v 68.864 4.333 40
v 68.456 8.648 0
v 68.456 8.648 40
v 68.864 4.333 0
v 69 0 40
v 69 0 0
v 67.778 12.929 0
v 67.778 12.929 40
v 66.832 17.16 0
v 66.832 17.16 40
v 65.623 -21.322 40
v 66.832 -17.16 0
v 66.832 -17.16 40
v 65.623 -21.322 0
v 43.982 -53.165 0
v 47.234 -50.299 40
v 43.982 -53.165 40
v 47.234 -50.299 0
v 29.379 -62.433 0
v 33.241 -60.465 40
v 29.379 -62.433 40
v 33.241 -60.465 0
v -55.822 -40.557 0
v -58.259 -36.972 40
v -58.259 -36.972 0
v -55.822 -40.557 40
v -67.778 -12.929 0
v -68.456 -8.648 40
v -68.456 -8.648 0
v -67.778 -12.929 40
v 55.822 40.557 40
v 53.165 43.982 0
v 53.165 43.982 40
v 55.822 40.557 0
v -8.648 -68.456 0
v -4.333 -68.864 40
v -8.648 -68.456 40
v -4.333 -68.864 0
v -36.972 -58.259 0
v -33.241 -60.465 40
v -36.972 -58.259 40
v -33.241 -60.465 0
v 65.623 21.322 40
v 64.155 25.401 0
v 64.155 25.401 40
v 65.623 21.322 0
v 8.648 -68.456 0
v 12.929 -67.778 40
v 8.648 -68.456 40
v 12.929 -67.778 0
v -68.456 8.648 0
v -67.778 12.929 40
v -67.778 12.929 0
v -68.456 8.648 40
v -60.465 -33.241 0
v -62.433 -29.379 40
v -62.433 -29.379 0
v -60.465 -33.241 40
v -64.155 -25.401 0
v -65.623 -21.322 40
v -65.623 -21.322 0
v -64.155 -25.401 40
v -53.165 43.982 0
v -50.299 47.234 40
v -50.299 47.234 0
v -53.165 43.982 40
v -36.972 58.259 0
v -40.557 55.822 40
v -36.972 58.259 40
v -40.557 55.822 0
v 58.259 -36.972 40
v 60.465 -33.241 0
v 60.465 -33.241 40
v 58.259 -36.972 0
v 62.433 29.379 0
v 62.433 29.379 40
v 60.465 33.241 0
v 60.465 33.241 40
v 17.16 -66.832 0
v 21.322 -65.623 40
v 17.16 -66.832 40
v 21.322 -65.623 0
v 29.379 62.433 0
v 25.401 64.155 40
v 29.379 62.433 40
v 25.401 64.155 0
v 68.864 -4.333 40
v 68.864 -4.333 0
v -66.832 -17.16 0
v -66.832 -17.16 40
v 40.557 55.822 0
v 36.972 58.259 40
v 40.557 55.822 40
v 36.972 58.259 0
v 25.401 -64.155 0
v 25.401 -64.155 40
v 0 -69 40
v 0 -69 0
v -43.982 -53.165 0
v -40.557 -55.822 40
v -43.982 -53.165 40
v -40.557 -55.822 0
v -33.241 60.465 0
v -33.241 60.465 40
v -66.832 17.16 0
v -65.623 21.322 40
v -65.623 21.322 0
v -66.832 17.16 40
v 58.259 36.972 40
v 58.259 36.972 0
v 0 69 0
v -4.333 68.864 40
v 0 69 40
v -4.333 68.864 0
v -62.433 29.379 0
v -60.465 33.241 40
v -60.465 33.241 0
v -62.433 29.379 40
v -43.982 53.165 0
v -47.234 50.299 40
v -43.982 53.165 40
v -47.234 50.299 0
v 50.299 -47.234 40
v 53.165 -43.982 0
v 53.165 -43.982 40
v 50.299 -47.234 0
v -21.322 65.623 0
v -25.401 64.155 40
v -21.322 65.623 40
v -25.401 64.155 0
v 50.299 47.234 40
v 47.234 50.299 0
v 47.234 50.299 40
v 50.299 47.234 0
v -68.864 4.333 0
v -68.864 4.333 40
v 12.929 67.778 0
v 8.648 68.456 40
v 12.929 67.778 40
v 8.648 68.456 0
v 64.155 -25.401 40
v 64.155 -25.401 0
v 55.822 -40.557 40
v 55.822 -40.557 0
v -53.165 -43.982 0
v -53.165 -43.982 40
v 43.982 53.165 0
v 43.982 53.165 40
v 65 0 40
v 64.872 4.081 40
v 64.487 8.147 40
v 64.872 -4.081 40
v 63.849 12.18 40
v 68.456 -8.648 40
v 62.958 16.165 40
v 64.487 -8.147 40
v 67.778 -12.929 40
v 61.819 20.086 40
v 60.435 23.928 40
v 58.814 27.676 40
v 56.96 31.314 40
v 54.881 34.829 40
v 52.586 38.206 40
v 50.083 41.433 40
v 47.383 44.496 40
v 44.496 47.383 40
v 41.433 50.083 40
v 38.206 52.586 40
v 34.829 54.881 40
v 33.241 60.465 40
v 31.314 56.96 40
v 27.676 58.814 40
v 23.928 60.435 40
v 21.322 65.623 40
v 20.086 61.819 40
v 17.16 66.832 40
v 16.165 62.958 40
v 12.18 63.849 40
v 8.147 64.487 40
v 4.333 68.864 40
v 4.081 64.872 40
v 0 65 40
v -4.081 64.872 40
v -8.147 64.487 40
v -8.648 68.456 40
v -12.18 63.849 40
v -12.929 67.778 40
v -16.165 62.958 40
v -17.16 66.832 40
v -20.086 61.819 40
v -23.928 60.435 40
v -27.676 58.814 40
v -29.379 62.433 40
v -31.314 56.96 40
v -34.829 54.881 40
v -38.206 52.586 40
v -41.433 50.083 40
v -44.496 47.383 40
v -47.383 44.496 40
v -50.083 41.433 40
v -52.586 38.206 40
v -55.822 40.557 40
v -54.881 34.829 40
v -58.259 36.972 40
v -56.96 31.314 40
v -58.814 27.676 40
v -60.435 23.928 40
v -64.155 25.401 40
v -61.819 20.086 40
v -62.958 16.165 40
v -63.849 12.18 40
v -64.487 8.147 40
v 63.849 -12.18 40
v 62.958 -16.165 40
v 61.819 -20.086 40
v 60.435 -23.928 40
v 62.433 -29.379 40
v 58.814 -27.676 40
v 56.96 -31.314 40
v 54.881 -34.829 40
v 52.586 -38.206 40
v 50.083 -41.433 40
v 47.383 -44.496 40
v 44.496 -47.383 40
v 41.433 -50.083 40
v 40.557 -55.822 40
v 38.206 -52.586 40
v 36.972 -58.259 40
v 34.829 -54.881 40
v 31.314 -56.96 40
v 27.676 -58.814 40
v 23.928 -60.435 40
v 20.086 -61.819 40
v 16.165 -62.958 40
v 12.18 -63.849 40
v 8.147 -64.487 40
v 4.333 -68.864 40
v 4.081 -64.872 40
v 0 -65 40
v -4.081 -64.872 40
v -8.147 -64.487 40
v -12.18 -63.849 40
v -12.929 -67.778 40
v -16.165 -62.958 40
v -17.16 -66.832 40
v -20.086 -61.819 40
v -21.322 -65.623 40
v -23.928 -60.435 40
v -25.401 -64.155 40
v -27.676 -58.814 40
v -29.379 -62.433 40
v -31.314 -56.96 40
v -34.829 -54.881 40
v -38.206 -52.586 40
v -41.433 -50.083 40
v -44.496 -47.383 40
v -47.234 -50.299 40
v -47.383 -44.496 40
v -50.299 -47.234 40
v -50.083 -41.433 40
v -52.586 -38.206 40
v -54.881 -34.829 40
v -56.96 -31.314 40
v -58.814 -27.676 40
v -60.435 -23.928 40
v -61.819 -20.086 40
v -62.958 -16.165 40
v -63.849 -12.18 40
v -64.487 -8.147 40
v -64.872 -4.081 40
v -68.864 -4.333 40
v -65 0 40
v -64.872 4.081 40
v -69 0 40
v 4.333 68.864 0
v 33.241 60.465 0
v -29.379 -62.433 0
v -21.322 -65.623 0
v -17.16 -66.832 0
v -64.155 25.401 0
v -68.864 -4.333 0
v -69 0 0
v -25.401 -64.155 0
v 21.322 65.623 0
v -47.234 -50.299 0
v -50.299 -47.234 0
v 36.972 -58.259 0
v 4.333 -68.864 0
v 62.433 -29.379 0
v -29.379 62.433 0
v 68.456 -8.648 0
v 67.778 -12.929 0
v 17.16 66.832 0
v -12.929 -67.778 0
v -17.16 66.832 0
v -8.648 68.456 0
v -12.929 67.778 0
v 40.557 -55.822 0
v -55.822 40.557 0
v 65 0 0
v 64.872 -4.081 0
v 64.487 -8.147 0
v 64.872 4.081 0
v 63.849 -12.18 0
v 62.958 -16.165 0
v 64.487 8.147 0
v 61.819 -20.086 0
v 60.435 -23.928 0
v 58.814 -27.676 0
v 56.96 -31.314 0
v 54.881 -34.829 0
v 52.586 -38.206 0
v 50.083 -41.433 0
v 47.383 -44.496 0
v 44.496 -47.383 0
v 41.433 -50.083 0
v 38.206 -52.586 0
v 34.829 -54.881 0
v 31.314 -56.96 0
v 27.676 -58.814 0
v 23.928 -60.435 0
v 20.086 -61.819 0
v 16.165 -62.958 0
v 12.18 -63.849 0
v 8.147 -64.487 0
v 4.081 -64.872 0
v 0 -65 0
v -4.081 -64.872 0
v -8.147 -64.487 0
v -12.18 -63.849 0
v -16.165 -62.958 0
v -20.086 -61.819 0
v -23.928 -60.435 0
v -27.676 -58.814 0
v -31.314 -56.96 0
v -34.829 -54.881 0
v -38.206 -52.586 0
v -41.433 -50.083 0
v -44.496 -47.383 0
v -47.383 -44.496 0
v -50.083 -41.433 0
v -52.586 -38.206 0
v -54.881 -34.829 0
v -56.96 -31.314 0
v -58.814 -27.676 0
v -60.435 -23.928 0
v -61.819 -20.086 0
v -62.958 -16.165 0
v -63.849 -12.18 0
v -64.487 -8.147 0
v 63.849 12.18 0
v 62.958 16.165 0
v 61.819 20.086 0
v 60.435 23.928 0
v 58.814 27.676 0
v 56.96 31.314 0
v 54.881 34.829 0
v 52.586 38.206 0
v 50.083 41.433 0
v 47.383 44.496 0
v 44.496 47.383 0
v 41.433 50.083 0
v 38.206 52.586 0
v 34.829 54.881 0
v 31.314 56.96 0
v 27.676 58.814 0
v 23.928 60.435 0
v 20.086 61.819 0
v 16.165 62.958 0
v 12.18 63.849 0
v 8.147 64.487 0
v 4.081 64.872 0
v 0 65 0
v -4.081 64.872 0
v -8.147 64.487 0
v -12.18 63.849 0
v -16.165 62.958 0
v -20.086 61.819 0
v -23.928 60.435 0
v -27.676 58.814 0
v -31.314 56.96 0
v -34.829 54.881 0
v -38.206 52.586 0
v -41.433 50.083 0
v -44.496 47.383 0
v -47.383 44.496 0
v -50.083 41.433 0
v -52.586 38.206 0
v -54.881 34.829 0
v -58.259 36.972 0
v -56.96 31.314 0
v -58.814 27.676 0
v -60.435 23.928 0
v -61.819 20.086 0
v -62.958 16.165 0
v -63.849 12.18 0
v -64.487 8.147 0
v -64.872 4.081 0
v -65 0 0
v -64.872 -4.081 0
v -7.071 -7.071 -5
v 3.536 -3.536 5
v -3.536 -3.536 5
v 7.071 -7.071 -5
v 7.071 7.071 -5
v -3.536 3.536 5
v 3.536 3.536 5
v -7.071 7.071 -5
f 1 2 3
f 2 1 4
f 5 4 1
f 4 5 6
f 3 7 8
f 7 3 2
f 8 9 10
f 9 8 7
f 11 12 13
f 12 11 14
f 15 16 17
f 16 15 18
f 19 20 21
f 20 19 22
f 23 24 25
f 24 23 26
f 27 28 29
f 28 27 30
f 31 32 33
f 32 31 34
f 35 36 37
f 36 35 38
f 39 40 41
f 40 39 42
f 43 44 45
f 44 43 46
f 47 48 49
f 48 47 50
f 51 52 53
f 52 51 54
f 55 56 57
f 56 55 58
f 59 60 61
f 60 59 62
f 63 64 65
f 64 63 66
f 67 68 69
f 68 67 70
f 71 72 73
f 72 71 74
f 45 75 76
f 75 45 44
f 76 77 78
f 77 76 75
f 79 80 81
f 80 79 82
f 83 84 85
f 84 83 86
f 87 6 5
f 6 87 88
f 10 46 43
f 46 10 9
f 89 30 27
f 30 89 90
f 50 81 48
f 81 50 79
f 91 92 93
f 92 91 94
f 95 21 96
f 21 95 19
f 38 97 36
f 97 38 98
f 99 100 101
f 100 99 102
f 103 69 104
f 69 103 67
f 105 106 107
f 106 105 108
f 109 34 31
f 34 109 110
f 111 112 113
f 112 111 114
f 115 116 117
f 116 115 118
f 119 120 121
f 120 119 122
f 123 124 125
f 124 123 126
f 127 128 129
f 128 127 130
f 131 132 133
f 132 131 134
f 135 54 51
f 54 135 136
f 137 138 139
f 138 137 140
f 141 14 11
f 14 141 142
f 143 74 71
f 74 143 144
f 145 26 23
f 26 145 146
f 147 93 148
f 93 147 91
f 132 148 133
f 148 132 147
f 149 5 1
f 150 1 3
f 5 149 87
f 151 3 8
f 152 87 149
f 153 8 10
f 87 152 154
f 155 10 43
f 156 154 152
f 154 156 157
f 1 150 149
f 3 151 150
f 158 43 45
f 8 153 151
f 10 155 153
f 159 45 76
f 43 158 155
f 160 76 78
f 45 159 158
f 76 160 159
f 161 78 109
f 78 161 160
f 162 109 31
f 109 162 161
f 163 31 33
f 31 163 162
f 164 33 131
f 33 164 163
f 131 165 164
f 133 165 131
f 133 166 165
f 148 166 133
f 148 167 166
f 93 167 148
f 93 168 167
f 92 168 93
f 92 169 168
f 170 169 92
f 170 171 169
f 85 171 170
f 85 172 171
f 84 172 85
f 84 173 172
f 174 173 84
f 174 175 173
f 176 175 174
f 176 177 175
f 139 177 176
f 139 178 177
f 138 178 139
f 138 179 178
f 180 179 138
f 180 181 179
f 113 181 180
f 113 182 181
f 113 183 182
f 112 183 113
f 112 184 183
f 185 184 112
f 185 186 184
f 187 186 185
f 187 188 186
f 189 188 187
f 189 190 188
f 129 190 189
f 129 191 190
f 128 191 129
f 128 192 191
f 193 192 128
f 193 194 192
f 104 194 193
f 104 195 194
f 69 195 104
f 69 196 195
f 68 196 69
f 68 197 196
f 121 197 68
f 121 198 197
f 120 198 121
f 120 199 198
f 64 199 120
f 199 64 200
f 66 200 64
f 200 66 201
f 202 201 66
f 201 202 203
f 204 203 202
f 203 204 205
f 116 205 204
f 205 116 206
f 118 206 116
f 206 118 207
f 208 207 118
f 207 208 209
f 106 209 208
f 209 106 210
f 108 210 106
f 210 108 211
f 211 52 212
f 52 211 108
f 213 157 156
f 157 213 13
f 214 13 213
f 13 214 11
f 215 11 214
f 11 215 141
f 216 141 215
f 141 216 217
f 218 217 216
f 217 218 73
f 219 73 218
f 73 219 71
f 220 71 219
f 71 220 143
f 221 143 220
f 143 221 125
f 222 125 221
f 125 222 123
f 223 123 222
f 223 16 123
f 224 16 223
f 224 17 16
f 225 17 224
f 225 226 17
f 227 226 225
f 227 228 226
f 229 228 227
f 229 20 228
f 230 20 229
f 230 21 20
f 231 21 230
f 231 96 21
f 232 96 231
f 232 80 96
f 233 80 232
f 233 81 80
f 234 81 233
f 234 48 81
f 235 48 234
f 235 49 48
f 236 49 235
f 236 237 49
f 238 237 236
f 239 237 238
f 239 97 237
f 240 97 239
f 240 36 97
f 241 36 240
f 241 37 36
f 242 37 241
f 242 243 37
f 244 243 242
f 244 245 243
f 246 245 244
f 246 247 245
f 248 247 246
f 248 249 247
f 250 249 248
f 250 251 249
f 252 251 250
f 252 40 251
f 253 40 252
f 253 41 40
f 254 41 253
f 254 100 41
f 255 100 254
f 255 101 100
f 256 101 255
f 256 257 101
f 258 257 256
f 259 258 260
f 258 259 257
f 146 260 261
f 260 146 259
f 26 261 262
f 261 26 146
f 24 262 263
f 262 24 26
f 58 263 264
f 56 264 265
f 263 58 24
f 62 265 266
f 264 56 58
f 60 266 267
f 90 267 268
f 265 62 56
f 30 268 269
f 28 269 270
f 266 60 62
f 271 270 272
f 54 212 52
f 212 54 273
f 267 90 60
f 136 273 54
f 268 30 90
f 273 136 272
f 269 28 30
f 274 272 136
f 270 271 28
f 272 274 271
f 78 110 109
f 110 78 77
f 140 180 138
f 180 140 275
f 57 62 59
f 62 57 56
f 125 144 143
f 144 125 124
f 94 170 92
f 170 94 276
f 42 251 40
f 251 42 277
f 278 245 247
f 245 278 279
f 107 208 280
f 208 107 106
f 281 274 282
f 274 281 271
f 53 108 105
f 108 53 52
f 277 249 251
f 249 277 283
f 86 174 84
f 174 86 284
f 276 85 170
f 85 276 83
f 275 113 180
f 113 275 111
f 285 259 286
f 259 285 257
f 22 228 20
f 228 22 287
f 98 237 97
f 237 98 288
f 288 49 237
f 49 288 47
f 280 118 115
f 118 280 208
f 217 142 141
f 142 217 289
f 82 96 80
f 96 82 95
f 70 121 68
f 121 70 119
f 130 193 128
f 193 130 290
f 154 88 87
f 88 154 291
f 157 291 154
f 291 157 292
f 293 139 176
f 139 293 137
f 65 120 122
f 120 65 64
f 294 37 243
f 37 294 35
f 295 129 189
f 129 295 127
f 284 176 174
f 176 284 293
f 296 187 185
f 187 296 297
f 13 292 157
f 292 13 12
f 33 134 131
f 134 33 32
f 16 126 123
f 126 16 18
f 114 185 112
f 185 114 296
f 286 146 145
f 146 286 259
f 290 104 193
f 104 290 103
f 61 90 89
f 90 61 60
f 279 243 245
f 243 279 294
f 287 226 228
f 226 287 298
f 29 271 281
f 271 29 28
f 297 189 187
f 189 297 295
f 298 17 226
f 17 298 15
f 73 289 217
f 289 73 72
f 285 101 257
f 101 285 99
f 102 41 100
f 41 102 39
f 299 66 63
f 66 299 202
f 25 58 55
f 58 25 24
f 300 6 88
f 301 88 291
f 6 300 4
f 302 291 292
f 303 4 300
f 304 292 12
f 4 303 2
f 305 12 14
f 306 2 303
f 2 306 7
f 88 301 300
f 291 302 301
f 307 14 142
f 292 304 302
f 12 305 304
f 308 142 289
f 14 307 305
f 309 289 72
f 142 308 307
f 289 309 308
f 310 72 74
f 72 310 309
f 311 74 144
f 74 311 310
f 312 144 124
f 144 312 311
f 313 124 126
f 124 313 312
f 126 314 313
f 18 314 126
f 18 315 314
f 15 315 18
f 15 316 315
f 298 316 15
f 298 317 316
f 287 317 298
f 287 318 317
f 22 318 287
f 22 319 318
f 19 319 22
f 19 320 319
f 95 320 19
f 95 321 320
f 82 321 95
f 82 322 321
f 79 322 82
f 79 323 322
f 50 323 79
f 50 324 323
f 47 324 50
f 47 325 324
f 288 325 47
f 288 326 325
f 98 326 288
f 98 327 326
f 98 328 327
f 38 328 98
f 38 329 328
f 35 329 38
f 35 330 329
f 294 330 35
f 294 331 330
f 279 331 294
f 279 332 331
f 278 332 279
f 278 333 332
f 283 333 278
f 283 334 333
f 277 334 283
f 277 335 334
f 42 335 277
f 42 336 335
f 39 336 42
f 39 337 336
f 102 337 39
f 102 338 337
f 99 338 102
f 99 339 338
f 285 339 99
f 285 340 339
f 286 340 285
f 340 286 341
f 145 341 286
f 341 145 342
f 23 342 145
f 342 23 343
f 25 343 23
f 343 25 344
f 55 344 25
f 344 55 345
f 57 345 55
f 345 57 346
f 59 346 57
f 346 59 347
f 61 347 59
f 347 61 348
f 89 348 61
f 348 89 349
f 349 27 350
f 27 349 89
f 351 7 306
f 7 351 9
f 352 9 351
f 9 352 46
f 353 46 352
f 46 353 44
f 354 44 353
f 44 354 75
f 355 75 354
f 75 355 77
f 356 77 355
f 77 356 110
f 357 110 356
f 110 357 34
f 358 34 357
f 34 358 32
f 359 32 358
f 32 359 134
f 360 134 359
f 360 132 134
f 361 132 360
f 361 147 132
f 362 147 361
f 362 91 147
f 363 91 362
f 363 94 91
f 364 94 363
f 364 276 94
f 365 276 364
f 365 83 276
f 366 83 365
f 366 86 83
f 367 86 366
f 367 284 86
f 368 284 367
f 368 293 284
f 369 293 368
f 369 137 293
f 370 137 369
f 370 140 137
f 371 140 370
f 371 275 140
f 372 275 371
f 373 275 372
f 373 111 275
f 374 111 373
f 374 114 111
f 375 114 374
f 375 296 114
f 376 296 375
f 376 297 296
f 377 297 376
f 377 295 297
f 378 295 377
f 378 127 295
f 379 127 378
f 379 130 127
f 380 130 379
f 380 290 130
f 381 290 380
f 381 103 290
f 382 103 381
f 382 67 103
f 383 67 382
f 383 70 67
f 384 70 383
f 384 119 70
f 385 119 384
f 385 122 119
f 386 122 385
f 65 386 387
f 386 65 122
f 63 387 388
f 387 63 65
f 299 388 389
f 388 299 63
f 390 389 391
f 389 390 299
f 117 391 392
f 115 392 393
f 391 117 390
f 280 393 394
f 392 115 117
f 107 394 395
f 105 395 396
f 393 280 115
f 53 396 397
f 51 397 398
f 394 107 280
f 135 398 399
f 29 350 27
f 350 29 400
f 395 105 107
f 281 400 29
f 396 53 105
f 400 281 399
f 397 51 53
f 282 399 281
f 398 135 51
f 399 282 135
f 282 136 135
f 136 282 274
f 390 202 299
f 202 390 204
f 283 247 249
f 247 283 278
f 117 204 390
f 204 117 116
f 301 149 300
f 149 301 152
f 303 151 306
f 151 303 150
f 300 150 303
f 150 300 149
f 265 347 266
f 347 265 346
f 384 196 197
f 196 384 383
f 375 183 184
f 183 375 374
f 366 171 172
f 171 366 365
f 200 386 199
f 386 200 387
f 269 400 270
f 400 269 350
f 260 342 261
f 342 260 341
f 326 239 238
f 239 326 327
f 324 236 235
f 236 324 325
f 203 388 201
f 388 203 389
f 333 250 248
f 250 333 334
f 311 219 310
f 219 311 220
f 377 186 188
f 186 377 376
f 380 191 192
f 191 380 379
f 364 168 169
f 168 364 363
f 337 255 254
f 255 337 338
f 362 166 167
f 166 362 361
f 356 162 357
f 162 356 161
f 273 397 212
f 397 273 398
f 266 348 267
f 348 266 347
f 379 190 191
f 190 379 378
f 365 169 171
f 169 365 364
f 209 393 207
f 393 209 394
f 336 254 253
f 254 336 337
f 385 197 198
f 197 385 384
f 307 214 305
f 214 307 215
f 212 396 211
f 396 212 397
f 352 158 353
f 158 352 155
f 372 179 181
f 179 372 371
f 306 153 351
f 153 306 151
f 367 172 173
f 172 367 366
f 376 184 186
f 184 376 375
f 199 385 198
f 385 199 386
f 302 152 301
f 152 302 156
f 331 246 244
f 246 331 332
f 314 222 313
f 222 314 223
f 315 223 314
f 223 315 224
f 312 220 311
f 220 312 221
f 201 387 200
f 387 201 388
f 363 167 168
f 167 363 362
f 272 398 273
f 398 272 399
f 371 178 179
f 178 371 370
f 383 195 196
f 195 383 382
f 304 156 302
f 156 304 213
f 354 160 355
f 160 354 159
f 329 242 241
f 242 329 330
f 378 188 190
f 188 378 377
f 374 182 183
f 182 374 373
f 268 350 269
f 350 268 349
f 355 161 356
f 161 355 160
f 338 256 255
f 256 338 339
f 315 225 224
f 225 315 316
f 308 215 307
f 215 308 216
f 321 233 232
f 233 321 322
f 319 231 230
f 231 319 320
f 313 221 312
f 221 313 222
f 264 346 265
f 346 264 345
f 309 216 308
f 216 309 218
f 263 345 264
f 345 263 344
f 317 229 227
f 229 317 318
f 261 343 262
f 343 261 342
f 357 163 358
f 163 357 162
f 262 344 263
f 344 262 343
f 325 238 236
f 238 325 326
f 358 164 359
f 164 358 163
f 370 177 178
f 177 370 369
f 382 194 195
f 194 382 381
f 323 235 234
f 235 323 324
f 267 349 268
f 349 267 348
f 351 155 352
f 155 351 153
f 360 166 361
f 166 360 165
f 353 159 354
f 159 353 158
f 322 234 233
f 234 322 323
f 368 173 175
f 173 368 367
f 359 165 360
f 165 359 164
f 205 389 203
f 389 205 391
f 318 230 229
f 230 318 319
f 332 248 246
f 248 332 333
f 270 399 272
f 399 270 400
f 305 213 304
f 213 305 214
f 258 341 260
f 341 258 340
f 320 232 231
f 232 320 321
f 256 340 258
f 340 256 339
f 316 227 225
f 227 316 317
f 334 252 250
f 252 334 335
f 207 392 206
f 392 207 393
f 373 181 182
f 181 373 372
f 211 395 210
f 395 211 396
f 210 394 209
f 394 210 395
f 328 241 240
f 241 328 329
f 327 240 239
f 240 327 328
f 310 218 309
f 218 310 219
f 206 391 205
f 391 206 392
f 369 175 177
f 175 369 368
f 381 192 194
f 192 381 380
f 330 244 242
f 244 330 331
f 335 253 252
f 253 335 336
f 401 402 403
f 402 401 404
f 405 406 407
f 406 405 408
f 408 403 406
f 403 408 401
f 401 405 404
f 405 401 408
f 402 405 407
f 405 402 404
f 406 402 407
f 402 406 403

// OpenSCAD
// Generated by SolidPython 1.1.3 on 2022-04-23 00:00:55
$fn = 100;


union() {
	rotate(a = [0, 0, 45]) {
		cylinder($fn = 4, center = true, h = 10, r1 = 10, r2 = 5);
	}
	difference() {
		cylinder(h = 40, r = 69);
		cylinder(h = 40, r = 65);
	}
}
/***********************************************
*********      SolidPython code:      **********
************************************************
 
from solid import *
from solid.utils import *

def pipe(innerRadius,thickness,height):
    return difference()(
        cylinder(r=innerRadius + thickness,h=height),
        cylinder(r=innerRadius,h=height)
    )

def trapetz(widtherWidth,smallerWidth,thickness,height):
    return rotate([0,0,45]) (
        cylinder(r1=widtherWidth,r2=smallerWidth,h=height,center=True,segments=4)
        )

d = union()(
    trapetz(10,5,10,10),
    pipe(65,4,40)
)














print(scad_render(d))


scad_render_to_file(d, 'triebwerk.scad', file_header = '$fn = 100;')
 
 
************************************************/
